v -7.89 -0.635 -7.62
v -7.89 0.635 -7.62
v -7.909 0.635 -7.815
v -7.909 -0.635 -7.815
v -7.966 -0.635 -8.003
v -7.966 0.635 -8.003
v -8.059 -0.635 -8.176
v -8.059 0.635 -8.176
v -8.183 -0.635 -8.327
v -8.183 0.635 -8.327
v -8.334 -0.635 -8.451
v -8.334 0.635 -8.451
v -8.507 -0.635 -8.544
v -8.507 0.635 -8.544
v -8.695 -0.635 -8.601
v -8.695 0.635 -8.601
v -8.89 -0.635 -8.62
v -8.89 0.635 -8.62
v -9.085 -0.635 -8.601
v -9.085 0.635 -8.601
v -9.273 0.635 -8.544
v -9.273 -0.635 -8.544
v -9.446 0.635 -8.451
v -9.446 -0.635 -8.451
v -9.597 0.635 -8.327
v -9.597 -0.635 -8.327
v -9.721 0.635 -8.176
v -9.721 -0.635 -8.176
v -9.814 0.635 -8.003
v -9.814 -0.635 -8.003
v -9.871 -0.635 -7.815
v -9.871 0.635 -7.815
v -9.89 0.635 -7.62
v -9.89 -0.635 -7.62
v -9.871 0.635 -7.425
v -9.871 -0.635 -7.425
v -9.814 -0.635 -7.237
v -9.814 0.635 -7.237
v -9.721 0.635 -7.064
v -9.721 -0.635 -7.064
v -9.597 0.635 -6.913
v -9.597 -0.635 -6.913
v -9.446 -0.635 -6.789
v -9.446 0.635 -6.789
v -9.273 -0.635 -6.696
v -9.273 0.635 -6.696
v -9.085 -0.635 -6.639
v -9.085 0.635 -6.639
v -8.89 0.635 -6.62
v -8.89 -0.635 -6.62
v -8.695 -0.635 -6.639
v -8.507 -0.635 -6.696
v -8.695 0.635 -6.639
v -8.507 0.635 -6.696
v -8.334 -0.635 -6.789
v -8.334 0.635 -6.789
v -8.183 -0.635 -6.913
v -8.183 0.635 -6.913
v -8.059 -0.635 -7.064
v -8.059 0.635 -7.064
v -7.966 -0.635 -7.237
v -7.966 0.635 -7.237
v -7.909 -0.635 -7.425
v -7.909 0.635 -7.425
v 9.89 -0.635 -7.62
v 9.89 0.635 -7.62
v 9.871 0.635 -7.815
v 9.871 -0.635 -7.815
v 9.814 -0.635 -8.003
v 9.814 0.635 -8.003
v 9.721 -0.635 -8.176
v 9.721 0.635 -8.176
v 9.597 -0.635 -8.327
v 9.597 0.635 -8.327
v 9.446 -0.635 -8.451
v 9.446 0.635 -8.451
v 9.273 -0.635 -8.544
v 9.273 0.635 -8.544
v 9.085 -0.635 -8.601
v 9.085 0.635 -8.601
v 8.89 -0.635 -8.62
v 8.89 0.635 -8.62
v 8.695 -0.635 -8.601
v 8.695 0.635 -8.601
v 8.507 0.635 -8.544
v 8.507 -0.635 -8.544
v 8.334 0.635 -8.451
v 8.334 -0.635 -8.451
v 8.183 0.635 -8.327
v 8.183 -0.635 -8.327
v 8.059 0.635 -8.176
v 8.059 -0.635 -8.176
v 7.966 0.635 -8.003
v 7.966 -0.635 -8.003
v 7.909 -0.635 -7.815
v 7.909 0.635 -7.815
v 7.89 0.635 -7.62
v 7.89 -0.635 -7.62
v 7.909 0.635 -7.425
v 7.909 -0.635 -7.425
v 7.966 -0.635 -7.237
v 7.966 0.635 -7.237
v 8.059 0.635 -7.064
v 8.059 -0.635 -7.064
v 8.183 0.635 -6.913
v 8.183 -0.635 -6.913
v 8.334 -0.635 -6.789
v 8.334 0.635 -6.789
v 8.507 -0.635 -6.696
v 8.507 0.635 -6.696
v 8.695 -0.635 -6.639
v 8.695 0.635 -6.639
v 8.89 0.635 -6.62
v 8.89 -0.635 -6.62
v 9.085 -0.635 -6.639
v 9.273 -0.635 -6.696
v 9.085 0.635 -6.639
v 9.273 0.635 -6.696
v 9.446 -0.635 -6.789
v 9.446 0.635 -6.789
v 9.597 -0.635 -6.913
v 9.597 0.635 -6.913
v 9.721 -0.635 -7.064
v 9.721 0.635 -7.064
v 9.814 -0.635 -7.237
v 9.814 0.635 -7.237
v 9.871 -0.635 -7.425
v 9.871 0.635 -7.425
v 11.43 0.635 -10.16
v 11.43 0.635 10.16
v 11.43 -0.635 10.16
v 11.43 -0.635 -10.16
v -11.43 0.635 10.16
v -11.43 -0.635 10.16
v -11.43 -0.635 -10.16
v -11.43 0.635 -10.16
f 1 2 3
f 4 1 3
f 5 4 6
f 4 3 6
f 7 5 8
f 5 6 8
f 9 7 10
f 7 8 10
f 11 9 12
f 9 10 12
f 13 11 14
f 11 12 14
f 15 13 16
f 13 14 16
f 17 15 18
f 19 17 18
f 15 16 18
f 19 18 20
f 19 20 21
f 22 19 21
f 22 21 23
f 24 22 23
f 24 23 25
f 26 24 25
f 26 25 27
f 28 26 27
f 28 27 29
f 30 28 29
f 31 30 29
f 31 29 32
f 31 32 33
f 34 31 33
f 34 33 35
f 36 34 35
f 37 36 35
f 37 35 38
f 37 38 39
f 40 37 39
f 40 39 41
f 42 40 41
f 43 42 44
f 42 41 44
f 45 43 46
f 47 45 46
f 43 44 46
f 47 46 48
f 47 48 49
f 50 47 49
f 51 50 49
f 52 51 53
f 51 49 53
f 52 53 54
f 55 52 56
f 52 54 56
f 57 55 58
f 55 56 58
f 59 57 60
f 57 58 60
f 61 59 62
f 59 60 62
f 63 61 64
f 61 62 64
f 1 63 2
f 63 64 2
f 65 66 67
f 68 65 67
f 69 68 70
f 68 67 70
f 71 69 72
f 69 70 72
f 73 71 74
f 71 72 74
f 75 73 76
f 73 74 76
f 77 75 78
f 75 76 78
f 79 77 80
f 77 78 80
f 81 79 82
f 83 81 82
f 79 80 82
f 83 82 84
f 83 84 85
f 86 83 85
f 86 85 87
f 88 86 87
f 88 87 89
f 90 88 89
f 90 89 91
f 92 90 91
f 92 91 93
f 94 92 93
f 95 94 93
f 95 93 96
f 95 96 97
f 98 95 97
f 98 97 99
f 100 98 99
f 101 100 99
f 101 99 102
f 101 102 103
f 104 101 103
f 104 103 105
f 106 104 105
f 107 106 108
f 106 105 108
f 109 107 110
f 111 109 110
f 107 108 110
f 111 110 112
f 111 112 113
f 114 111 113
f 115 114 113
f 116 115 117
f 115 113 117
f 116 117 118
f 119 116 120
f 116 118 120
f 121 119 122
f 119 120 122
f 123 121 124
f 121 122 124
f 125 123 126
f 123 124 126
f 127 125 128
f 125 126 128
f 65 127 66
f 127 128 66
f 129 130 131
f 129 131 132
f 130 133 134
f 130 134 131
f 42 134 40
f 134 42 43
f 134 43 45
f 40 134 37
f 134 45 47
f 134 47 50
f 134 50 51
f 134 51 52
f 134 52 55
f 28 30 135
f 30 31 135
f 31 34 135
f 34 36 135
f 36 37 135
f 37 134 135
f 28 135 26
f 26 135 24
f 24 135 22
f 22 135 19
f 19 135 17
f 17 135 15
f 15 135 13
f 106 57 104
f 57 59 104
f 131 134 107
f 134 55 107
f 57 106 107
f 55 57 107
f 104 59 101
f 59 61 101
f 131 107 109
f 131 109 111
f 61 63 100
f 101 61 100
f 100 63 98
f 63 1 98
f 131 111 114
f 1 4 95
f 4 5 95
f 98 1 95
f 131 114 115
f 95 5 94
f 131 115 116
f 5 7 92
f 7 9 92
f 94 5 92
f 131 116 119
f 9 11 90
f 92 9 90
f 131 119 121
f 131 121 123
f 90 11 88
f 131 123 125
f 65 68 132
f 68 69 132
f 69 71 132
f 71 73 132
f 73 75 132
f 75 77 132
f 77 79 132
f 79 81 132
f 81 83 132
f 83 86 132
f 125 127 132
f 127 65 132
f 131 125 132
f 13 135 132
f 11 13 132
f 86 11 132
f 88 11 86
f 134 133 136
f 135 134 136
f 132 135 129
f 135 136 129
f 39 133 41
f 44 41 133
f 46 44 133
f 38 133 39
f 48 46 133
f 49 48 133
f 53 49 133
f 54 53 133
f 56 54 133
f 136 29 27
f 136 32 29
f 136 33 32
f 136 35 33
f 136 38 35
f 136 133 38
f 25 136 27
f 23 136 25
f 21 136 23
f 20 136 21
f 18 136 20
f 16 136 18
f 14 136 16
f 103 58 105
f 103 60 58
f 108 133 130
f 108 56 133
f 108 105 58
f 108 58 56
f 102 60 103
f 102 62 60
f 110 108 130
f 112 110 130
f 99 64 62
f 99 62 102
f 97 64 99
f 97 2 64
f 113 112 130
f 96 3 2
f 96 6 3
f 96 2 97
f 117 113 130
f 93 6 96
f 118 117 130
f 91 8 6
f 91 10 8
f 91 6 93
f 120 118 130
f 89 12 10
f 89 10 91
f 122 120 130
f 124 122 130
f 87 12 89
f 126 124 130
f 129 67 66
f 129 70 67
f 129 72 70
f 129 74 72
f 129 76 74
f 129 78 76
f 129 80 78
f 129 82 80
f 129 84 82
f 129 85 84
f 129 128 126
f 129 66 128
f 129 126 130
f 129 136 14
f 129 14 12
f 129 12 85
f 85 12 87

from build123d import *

# Parameters (mm, degrees)
SKETCH1_W               = 22.86
SKETCH1_H               = 20.32
BOSS_EXTRUDE1_DEPTH     = 0.635
SKETCH2_R               = 1
CUT_EXTRUDE1_DEPTH      = 1
CUT_EXTRUDE1_DEPTH_BACK = 2.27


with BuildPart() as part:
    # Sketch1 → Boss-Extrude1 (new body, symmetric)
    with BuildSketch(Plane(origin=(0, 0, 0), x_dir=(1, 0, 0), z_dir=(0, 1, 0))):
        Rectangle(SKETCH1_W, SKETCH1_H)
    extrude(amount=BOSS_EXTRUDE1_DEPTH, both=True)

    # Sketch2 → Cut-Extrude1 (cut, two sides)
    with BuildSketch(Plane(origin=(0, 0.635, 0), x_dir=(1, 0, 0), z_dir=(0, 1, 0))) as cut_extrude1_sk:
        with Locations((-8.89, 7.62)):
            Circle(SKETCH2_R)
        with Locations((8.89, 7.62)):
            Circle(SKETCH2_R)
    extrude(amount=CUT_EXTRUDE1_DEPTH, mode=Mode.SUBTRACT)
    extrude(cut_extrude1_sk.sketch, amount=-CUT_EXTRUDE1_DEPTH_BACK, mode=Mode.SUBTRACT)


solid = part.part
